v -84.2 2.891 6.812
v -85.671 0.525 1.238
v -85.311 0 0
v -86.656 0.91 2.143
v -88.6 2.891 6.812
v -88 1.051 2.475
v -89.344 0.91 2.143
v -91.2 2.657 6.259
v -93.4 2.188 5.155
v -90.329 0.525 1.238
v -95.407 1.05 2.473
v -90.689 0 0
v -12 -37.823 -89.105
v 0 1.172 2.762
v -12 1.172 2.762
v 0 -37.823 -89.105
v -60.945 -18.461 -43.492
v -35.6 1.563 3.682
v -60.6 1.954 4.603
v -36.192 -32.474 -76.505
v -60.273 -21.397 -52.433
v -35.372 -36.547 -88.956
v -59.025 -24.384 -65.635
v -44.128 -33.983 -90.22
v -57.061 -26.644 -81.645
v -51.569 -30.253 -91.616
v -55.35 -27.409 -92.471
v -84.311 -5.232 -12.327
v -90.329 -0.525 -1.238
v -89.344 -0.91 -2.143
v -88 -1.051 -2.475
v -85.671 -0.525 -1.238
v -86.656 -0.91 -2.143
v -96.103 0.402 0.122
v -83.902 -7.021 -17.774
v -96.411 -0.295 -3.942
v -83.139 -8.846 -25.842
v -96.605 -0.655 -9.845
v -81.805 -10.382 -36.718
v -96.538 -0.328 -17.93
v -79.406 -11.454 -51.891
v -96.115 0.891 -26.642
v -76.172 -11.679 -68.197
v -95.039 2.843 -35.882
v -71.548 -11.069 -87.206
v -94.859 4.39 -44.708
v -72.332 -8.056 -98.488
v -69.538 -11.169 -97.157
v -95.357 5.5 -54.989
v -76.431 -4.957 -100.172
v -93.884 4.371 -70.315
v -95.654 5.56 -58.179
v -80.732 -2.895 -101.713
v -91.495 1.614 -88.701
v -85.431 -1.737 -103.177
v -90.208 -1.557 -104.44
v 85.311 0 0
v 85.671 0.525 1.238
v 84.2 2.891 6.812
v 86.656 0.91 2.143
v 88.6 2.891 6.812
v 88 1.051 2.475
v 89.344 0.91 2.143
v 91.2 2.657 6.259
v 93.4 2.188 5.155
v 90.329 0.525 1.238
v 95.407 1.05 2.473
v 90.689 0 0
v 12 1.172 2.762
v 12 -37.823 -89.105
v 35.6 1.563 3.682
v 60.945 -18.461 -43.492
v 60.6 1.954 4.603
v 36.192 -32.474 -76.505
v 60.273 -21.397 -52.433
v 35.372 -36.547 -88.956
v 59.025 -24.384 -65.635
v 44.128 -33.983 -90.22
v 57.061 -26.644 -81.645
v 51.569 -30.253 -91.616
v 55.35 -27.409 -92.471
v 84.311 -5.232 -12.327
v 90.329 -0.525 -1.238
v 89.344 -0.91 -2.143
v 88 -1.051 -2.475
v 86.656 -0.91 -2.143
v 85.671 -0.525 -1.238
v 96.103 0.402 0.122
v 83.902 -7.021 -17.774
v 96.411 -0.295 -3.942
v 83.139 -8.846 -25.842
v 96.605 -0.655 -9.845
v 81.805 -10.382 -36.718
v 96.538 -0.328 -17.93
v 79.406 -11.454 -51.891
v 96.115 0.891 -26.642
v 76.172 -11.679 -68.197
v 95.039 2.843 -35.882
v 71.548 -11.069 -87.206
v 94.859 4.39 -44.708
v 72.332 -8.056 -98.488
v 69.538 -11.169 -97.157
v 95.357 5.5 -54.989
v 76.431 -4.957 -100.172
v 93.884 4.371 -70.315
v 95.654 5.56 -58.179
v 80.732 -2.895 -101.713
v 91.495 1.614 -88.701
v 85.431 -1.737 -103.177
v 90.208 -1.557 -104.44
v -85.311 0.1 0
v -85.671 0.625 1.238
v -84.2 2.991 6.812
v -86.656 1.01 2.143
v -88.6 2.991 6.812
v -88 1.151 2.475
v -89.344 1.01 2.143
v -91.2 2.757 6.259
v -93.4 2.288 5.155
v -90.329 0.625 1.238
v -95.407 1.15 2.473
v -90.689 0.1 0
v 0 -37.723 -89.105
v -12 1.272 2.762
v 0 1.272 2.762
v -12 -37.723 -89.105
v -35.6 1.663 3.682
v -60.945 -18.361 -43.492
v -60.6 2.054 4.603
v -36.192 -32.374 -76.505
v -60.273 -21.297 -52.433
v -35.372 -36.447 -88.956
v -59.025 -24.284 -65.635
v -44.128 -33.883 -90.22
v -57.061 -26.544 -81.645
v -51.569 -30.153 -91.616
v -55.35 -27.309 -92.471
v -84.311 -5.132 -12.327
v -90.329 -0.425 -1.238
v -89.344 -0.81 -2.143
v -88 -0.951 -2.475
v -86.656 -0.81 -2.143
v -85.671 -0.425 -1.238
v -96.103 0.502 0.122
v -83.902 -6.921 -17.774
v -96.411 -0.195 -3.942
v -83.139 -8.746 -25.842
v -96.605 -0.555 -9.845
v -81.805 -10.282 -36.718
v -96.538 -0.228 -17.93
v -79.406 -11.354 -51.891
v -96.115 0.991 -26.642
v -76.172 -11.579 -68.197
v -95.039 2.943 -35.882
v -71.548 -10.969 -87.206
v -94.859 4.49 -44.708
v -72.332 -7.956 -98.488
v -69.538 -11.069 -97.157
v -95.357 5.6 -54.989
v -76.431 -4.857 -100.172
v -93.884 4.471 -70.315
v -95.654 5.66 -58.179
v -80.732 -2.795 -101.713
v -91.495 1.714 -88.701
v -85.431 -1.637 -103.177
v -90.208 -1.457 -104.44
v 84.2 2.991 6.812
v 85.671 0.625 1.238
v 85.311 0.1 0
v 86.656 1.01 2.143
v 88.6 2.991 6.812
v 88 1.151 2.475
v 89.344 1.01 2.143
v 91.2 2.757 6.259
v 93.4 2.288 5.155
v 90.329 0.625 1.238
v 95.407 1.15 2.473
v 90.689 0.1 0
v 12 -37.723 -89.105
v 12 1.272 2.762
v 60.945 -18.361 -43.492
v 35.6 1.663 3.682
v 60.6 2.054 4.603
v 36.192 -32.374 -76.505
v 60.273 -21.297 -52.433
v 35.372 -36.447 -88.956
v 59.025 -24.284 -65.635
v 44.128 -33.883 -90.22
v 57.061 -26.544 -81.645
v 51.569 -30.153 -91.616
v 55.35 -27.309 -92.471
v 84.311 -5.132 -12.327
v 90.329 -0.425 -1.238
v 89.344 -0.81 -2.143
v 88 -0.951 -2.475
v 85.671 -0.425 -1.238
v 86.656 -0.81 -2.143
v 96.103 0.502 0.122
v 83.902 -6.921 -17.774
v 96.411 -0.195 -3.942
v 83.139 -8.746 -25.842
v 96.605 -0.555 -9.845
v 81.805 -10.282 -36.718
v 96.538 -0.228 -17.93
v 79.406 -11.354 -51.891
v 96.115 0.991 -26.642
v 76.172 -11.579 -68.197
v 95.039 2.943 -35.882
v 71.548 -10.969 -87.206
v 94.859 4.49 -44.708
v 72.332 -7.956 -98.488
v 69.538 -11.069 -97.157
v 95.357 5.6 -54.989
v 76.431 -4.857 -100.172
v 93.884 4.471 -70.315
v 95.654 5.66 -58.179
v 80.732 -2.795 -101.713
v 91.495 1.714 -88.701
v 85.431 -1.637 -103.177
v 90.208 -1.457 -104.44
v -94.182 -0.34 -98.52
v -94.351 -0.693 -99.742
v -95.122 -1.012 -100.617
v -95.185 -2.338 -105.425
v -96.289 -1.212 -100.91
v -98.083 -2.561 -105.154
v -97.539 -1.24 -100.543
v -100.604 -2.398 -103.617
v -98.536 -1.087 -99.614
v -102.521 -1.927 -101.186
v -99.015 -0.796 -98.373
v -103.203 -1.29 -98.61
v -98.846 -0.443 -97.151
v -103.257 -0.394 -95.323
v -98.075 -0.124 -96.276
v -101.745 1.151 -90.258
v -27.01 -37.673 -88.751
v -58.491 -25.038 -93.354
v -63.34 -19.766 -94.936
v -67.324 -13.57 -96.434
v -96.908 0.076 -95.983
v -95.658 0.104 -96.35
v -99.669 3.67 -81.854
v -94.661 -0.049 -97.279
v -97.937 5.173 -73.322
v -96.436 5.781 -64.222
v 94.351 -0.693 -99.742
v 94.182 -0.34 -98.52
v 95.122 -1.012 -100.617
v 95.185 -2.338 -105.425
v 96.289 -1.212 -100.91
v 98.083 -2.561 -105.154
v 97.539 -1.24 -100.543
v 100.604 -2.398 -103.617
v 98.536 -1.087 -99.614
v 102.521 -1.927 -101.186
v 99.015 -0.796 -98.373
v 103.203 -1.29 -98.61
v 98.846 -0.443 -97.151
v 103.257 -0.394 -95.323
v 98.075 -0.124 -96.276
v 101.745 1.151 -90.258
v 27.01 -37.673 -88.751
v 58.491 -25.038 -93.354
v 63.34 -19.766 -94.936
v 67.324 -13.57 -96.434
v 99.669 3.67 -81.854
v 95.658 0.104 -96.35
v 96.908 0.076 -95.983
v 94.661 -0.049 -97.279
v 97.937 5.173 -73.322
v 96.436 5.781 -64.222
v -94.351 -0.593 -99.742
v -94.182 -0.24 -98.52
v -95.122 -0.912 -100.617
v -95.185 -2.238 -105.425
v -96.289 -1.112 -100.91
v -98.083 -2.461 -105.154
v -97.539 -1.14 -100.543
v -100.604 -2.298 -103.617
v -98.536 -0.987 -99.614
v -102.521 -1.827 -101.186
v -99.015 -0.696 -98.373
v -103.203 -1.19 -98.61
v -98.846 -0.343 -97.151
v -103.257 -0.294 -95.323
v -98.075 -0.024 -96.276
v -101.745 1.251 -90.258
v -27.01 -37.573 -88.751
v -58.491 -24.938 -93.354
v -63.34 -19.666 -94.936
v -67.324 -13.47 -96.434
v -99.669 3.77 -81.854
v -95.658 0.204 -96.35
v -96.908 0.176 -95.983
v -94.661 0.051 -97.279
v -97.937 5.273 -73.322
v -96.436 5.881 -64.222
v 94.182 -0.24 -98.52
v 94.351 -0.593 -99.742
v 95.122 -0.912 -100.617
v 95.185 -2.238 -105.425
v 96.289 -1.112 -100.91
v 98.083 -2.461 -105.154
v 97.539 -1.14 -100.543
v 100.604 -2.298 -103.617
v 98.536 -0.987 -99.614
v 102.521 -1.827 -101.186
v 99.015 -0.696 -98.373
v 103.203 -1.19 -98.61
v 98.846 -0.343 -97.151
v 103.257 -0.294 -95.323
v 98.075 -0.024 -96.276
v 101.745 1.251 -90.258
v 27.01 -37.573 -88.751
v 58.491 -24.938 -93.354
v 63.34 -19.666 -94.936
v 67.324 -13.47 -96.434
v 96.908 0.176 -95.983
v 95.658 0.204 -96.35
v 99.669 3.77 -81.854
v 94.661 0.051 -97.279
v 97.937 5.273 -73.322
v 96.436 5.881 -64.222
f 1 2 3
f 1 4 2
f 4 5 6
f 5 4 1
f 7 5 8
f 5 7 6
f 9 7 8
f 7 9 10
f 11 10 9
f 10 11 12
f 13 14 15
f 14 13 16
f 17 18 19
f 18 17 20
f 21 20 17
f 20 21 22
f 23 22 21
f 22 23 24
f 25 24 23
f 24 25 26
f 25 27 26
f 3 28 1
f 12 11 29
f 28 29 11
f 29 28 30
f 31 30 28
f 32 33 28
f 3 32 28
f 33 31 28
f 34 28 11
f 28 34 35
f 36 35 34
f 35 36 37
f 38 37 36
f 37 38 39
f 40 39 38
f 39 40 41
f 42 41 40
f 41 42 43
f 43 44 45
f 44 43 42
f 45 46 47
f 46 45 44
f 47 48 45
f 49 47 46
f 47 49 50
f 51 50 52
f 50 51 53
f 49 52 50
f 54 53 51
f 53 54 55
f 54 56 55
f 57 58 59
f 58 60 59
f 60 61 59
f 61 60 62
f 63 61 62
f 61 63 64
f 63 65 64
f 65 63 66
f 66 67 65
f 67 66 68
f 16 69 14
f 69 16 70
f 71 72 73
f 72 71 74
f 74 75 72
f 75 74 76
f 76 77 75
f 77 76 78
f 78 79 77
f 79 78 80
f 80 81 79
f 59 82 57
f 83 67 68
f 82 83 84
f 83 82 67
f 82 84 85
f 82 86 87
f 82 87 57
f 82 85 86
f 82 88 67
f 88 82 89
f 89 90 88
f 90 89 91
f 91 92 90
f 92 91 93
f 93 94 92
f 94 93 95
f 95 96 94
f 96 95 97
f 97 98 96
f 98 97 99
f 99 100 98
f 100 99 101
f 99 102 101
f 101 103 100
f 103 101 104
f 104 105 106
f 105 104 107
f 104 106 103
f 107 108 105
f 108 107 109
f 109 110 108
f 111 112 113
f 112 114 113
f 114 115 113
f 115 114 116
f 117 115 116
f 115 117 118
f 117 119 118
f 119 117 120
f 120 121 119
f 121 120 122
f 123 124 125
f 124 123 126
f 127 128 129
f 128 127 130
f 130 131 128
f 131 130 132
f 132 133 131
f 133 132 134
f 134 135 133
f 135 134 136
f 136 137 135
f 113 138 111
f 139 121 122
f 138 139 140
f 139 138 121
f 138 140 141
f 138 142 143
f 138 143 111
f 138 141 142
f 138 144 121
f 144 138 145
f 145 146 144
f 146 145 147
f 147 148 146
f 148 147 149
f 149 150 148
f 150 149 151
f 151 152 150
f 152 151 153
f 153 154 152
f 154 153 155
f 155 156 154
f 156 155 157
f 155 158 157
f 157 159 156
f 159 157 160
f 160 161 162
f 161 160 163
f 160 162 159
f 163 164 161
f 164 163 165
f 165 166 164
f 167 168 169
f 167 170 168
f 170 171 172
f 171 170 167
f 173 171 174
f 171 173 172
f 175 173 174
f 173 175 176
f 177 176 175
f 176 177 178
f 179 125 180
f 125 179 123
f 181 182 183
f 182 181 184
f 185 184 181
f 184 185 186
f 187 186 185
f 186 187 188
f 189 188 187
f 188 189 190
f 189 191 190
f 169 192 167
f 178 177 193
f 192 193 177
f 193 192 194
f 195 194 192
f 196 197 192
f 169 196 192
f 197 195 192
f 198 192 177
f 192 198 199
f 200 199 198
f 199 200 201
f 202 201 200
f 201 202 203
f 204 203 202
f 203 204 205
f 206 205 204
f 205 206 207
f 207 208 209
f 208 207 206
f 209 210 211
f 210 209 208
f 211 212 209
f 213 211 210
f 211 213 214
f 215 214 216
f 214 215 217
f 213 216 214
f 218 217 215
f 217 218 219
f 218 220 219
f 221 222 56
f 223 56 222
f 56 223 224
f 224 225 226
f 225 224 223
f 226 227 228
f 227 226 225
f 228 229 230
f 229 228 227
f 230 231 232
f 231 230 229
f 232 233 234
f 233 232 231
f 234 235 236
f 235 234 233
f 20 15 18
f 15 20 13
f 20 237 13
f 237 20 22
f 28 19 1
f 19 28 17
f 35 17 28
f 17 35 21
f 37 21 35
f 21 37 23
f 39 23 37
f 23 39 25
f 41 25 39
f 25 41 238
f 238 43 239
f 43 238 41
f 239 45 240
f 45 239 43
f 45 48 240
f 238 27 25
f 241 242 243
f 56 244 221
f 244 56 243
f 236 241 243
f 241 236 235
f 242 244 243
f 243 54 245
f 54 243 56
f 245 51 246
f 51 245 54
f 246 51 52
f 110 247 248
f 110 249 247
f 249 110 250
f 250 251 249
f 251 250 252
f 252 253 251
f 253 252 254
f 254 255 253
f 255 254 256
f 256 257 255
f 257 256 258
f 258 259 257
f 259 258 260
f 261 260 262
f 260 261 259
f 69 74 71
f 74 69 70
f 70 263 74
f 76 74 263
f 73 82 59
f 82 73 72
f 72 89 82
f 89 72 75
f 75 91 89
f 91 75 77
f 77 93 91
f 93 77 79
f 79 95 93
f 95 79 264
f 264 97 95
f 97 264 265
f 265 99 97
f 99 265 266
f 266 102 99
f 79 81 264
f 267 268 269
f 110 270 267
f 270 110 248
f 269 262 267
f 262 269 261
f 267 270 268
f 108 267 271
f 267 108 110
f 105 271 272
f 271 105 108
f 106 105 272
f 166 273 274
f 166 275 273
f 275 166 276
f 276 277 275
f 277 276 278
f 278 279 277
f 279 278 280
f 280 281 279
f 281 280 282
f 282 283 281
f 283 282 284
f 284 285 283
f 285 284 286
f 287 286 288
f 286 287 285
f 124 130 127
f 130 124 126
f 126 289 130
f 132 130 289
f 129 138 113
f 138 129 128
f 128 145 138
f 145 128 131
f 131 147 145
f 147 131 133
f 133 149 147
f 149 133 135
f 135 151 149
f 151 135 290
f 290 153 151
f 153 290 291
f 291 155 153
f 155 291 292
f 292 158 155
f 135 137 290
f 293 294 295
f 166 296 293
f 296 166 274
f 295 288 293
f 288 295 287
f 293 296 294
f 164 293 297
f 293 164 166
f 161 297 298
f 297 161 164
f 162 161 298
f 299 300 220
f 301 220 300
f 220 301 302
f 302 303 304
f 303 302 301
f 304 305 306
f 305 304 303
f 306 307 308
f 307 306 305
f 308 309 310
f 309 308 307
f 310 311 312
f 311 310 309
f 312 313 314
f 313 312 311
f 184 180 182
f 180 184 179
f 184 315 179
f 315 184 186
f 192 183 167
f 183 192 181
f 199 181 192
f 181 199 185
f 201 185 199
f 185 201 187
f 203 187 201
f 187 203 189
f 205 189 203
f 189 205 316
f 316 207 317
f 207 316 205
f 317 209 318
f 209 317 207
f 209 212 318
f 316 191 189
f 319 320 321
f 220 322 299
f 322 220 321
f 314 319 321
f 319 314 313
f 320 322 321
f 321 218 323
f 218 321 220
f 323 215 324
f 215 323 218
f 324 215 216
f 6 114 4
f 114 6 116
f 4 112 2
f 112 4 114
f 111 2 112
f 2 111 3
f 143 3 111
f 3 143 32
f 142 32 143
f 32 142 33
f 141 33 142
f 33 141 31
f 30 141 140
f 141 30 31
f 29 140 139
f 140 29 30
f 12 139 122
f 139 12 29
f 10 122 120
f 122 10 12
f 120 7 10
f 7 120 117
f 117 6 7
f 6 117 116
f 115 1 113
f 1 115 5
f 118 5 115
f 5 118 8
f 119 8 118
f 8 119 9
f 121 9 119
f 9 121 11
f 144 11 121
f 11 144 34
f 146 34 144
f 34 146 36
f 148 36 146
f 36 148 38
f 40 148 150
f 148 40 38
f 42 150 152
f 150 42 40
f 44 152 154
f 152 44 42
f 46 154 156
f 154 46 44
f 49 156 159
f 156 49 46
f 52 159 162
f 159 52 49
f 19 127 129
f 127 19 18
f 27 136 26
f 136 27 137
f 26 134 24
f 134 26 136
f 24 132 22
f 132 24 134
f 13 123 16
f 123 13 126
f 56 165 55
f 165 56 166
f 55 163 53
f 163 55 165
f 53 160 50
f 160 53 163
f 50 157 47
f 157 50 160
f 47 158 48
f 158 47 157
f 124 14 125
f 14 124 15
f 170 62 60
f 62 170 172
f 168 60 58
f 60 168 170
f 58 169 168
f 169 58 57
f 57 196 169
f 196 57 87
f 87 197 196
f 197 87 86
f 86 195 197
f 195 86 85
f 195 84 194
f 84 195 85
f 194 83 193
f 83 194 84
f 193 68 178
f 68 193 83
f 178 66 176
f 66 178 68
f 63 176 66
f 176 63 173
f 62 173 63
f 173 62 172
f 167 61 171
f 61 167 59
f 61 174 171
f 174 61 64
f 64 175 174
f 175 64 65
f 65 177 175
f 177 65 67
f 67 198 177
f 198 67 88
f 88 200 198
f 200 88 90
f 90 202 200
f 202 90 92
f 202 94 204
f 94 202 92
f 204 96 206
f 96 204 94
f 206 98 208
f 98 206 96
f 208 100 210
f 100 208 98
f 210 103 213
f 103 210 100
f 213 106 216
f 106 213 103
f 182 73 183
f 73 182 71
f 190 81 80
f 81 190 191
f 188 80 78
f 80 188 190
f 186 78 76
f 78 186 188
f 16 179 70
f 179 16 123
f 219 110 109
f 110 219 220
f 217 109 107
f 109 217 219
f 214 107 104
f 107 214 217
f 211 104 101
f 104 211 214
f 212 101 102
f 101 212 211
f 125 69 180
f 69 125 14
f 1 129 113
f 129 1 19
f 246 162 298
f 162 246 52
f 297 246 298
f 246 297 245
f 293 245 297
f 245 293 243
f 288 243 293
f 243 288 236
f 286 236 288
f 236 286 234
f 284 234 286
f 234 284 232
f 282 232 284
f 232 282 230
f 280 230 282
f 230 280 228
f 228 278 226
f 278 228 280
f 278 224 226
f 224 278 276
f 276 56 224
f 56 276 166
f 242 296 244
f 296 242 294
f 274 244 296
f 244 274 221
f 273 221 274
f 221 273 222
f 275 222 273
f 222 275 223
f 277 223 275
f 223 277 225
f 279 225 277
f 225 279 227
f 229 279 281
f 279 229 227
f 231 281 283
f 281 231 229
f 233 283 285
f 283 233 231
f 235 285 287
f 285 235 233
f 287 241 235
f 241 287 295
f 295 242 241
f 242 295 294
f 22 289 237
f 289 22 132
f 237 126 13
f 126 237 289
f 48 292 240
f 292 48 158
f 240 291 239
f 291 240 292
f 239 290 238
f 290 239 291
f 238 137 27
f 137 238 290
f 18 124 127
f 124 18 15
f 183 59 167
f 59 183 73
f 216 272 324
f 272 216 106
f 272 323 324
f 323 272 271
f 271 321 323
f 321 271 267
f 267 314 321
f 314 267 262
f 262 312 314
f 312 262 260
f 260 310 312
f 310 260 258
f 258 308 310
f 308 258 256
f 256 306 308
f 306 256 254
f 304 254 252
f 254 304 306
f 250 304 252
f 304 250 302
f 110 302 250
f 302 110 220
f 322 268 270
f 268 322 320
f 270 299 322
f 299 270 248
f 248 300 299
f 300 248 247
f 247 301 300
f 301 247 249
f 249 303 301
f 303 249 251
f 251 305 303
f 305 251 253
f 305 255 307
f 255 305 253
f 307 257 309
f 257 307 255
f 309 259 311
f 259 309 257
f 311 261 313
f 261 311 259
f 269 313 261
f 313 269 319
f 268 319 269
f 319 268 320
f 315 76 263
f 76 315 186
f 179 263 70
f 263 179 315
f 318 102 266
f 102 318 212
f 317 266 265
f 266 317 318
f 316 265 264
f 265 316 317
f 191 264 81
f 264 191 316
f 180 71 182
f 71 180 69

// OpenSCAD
use <../lib.scad>
use <s/u9495c01s01.scad>
use <s/u9495c01s02.scad>
use <s/u9495c01s03.scad>
use <s/u9495c01s04.scad>
$fa=1; $fs=0.2;
function ldraw_lib__u9495c01(realsolid=false) = [
// 0 Sail 30 x 15 Trapezoidal (Formed Shape 1)
// 0 Name: u9495c01.dat
// 0 Author: Philippe Hurbain [Philo]
// 0 !LDRAW_ORG Part UPDATE 2020-03
// 0 !LICENSE Licensed under CC BY 2.0 and CC BY 4.0 : see CAreadme.txt
// 
// 0 BFC CERTIFY CCW
  [0,"BFC","CERTIFY"],
  [0,"BFC","CCW"],
// 
// 0 !CATEGORY Sheet Fabric
// 
// 0 !HISTORY 2020-12-29 [PTadmin] Official Update 2020-03
// 
// 
// 1 16 0 0 0 1 0 0 0 1 0 0 0 1 s\u9495c01s01.dat
  [1,16,0,0,0,1,0,0,0,1,0,0,0,1, ldraw_lib__s__u9495c01s01(realsolid)],
// 1 16 0 0 0 -1 0 0 0 1 0 0 0 1 s\u9495c01s01.dat
  [1,16,0,0,0,-1,0,0,0,1,0,0,0,1, ldraw_lib__s__u9495c01s01(realsolid)],
// 0 BFC INVERTNEXT
  [0,"BFC","INVERTNEXT"],
// 1 16 0 0 0.25 1 0 0 0 1 0 0 0 1 s\u9495c01s01.dat
  [1,16,0,0,0.25,1,0,0,0,1,0,0,0,1, ldraw_lib__s__u9495c01s01(realsolid)],
// 0 BFC INVERTNEXT
  [0,"BFC","INVERTNEXT"],
// 1 16 0 0 0.25 -1 0 0 0 1 0 0 0 1 s\u9495c01s01.dat
  [1,16,0,0,0.25,-1,0,0,0,1,0,0,0,1, ldraw_lib__s__u9495c01s01(realsolid)],
// 
// 1 16 0 0 0 1 0 0 0 1 0 0 0 1 s\u9495c01s02.dat
  [1,16,0,0,0,1,0,0,0,1,0,0,0,1, ldraw_lib__s__u9495c01s02(realsolid)],
// 1 16 0 0 0 -1 0 0 0 1 0 0 0 1 s\u9495c01s02.dat
  [1,16,0,0,0,-1,0,0,0,1,0,0,0,1, ldraw_lib__s__u9495c01s02(realsolid)],
// 0 BFC INVERTNEXT
  [0,"BFC","INVERTNEXT"],
// 1 16 0 0 0.25 1 0 0 0 1 0 0 0 1 s\u9495c01s02.dat
  [1,16,0,0,0.25,1,0,0,0,1,0,0,0,1, ldraw_lib__s__u9495c01s02(realsolid)],
// 0 BFC INVERTNEXT
  [0,"BFC","INVERTNEXT"],
// 1 16 0 0 0.25 -1 0 0 0 1 0 0 0 1 s\u9495c01s02.dat
  [1,16,0,0,0.25,-1,0,0,0,1,0,0,0,1, ldraw_lib__s__u9495c01s02(realsolid)],
// 
// 1 16 0 0 0 1 0 0 0 1 0 0 0 1 s\u9495c01s03.dat
  [1,16,0,0,0,1,0,0,0,1,0,0,0,1, ldraw_lib__s__u9495c01s03(realsolid)],
// 1 16 0 0 0 -1 0 0 0 1 0 0 0 1 s\u9495c01s03.dat
  [1,16,0,0,0,-1,0,0,0,1,0,0,0,1, ldraw_lib__s__u9495c01s03(realsolid)],
// 
// 1 16 0 0 0 1 0 0 0 1 0 0 0 1 s\u9495c01s04.dat
  [1,16,0,0,0,1,0,0,0,1,0,0,0,1, ldraw_lib__s__u9495c01s04(realsolid)],
// 1 16 0 0 0 -1 0 0 0 1 0 0 0 1 s\u9495c01s04.dat
  [1,16,0,0,0,-1,0,0,0,1,0,0,0,1, ldraw_lib__s__u9495c01s04(realsolid)],
];
module ldraw_lib__u9495c01(step=0, col=false, unit=2/5, alt=false, line=0.2, solid=!$preview)
    makepoly(ldraw_lib__u9495c01(solid), step=step, col=col, unit=unit, alt=alt, line=line, solid=solid);
ldraw_lib__u9495c01(line=0.2);
